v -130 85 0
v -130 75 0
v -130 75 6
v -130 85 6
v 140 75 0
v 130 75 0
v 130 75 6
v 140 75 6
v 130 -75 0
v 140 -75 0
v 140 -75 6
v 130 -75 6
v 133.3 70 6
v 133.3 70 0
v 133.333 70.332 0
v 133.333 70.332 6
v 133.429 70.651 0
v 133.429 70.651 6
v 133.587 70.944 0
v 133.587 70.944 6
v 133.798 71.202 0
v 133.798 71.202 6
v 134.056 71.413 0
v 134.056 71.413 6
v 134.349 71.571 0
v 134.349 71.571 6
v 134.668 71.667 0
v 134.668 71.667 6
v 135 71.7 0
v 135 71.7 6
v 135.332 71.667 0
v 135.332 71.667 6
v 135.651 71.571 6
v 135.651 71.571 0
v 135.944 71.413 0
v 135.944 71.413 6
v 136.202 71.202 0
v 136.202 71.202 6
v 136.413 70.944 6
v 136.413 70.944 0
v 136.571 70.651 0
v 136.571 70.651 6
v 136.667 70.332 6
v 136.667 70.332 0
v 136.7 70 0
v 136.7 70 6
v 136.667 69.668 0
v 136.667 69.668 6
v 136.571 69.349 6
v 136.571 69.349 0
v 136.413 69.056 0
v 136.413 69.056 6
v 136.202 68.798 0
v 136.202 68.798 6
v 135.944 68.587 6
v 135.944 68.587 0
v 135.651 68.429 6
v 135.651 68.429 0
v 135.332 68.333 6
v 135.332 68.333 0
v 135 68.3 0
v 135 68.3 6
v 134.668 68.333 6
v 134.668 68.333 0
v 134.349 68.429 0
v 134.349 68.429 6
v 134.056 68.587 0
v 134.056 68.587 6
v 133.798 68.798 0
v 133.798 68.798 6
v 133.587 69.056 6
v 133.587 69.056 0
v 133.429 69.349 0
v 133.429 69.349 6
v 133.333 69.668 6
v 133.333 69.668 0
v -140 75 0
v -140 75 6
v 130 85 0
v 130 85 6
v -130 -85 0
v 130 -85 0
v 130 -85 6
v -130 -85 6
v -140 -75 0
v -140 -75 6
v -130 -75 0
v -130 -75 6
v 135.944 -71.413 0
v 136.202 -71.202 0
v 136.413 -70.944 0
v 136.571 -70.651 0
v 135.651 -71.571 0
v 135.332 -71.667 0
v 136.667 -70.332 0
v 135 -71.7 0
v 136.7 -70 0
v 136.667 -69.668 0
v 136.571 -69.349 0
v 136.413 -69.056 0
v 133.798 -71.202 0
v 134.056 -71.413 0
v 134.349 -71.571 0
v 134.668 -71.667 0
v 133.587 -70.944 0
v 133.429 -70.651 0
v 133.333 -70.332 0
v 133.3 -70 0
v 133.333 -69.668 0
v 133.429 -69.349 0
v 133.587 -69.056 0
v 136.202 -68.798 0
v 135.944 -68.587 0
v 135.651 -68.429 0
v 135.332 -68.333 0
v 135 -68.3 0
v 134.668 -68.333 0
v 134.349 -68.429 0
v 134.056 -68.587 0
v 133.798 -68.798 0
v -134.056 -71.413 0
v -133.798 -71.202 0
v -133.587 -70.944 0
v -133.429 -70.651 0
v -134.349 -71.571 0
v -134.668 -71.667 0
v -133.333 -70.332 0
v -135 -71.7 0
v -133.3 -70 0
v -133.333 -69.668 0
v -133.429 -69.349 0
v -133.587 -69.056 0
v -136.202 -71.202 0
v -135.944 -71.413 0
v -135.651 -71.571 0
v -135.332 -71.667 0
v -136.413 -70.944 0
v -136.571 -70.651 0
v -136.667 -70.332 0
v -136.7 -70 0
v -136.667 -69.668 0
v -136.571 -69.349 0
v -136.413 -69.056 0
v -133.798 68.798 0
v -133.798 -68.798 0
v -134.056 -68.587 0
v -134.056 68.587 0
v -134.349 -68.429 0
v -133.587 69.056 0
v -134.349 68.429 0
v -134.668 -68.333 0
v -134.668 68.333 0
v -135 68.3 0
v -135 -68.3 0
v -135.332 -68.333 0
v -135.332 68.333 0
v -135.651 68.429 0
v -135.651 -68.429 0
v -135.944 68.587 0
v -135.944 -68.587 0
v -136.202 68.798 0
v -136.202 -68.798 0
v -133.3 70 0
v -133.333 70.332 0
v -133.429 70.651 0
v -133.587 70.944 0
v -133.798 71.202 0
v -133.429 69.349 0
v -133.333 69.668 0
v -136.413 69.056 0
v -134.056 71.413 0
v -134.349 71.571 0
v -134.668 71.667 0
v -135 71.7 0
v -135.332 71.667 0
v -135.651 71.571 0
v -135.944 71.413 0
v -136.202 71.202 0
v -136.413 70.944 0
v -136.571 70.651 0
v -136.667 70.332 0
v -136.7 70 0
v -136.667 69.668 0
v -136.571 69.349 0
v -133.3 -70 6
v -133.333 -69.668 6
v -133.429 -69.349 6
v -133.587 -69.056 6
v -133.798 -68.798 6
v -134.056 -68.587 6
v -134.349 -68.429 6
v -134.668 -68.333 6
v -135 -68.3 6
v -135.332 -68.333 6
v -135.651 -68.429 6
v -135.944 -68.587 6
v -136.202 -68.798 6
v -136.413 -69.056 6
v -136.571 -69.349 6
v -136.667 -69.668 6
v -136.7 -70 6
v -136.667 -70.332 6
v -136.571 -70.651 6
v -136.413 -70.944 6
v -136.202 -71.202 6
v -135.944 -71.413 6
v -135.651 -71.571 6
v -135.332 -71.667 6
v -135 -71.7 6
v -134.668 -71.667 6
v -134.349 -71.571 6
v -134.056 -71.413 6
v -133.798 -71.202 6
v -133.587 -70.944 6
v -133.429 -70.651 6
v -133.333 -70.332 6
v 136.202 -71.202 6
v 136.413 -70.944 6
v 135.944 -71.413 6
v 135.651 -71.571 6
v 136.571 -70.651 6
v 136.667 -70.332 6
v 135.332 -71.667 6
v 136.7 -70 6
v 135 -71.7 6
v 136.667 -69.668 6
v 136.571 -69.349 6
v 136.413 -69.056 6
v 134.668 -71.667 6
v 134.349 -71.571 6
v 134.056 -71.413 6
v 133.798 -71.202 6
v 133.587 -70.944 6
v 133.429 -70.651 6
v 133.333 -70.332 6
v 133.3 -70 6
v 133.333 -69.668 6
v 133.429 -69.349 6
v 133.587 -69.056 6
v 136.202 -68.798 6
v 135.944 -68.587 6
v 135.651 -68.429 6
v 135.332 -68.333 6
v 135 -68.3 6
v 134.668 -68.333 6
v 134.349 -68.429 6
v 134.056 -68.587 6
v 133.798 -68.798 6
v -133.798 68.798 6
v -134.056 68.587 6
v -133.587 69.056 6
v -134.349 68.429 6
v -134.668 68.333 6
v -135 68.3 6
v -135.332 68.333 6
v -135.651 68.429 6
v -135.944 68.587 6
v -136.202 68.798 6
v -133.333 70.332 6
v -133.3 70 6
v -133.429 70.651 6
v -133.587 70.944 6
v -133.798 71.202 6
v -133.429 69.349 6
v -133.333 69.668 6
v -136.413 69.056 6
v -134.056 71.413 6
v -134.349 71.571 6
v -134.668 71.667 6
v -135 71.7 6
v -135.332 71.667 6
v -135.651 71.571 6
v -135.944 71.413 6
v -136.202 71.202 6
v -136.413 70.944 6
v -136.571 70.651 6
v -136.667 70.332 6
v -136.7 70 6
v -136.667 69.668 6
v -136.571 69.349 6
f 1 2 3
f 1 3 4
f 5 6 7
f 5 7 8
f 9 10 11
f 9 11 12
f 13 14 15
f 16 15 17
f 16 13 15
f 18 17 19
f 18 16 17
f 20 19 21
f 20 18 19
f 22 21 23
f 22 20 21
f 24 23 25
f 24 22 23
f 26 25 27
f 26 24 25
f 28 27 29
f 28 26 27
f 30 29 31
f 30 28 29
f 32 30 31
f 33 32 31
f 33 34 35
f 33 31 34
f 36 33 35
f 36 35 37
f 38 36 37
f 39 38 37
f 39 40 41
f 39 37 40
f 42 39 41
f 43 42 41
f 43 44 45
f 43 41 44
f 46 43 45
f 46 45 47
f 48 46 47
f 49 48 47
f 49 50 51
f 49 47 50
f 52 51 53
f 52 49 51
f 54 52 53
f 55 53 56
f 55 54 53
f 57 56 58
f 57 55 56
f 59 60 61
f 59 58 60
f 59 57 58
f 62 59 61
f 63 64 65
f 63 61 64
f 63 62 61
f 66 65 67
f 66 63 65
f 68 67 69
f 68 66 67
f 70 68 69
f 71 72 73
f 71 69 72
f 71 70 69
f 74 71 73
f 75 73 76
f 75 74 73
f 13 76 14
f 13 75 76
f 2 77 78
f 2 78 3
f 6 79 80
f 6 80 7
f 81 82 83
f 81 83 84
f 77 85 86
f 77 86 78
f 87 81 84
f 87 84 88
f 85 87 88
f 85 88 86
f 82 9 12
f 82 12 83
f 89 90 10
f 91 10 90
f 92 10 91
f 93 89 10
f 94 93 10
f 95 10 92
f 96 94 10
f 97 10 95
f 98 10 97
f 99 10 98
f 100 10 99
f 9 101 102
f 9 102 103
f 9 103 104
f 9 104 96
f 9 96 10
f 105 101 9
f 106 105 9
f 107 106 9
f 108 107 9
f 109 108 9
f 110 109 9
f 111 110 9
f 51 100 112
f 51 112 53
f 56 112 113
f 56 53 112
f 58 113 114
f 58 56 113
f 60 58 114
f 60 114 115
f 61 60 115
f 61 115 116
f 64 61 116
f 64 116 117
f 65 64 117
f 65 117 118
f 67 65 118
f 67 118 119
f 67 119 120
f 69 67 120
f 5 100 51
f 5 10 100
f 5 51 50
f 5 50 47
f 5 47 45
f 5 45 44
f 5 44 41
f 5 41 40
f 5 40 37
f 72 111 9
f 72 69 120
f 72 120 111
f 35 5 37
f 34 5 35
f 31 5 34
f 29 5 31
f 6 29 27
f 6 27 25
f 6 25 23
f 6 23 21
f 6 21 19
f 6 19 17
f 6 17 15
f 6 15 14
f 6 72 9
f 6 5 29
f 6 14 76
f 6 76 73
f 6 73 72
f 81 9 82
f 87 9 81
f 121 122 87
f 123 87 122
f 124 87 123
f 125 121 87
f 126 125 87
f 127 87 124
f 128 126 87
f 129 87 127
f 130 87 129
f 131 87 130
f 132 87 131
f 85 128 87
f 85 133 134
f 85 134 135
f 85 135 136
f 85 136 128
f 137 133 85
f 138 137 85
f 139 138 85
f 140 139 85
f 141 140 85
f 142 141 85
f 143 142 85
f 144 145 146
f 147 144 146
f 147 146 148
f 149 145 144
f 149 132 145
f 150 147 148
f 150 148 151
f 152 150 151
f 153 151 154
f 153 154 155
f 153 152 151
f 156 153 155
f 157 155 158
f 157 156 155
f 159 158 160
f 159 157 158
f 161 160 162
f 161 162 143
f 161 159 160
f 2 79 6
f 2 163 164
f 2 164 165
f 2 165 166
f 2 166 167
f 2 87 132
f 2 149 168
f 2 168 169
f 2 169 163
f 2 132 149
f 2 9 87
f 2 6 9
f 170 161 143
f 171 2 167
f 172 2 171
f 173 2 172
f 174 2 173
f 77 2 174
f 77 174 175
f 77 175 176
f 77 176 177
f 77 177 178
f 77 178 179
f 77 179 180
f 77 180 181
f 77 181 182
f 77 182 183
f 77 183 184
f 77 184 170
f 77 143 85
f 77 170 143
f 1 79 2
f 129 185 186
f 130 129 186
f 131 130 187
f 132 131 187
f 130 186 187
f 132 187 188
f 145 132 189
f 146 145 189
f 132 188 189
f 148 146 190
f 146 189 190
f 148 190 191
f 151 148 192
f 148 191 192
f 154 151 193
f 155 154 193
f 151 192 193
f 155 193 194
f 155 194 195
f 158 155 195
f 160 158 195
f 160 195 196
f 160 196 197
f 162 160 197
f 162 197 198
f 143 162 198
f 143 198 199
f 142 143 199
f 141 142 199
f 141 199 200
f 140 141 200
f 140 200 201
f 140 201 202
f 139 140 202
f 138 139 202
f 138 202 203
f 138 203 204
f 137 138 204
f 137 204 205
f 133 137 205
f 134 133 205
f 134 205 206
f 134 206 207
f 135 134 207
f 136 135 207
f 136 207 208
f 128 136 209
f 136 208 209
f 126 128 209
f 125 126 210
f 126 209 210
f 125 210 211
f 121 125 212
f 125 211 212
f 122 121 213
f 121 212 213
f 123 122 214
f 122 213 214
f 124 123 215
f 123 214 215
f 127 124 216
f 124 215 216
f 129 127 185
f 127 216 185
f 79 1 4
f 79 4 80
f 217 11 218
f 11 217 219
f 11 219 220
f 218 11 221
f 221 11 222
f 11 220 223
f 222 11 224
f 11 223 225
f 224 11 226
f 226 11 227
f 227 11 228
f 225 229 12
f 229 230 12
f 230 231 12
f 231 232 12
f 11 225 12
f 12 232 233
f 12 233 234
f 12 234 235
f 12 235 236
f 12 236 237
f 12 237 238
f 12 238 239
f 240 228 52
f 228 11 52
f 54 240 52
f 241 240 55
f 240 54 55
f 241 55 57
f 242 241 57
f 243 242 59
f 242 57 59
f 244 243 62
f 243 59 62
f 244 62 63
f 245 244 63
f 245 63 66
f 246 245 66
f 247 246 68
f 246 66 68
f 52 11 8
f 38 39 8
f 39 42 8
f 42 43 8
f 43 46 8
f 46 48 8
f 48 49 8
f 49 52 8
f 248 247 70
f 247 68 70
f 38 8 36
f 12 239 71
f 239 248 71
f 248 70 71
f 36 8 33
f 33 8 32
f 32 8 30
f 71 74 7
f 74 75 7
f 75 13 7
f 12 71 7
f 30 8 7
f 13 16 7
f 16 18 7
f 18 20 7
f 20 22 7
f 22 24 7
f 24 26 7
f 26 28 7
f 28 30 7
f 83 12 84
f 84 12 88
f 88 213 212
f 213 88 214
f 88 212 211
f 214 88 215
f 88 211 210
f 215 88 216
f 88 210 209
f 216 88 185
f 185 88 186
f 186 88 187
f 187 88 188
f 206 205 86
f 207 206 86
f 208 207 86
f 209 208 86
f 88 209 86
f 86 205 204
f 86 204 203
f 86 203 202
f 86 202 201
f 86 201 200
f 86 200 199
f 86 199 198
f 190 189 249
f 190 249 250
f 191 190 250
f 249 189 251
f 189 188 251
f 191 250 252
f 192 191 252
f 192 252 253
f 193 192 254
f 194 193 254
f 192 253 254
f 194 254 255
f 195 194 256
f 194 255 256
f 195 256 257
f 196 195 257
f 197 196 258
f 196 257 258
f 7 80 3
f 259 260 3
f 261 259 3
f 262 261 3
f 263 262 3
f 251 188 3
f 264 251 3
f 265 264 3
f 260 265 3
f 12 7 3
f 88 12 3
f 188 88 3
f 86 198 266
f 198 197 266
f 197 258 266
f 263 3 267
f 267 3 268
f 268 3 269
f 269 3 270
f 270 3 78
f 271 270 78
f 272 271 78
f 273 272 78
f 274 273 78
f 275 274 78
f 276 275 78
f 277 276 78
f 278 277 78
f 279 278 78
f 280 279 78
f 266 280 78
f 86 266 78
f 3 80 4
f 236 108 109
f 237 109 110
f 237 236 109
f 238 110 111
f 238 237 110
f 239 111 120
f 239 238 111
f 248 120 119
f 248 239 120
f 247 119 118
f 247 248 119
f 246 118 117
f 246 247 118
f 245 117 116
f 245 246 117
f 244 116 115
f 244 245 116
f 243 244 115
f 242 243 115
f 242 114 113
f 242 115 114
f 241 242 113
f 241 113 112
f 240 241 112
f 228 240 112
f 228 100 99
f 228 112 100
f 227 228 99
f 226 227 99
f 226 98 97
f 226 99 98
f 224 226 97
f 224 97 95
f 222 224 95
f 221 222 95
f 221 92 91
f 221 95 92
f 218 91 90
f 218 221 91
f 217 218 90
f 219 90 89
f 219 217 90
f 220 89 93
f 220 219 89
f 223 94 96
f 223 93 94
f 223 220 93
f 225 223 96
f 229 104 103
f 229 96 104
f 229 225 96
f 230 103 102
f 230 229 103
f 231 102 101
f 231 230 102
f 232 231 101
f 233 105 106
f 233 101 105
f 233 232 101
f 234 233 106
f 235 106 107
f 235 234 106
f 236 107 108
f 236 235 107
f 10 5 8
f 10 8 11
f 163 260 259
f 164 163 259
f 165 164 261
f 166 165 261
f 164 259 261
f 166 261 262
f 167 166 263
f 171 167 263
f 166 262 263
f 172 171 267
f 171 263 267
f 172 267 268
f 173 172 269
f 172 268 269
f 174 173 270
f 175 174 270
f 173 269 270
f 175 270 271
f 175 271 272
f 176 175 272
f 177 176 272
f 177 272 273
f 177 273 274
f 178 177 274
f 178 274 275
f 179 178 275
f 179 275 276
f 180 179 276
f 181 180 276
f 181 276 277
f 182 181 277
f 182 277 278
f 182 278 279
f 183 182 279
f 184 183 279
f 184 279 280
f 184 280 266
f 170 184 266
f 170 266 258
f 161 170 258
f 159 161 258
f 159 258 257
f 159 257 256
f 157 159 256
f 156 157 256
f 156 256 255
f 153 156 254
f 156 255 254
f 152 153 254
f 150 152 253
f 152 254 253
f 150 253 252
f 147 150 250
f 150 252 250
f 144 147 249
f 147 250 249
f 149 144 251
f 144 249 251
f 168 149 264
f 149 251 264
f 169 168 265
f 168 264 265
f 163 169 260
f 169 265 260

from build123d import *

# Parameters (mm, degrees)
PAD_DEPTH    = 6
SKETCH001_R  = 1.7
POCKET_DEPTH = 661.244466


with BuildPart() as part:
    # Sketch → Pad (new body)
    with BuildSketch(Plane.XY):
        Polygon((-140, -75), (-140, 75), (-130, 75), (-130, 85), (130, 85), (130, 75), (140, 75), (140, -75), (130, -75), (130, -85), (-130, -85), (-130, -75), align=None)
    extrude(amount=PAD_DEPTH)

    # Sketch001 (on Face14 of Pad) → Pocket (cut, through all)
    with BuildSketch(Plane.XY.offset(6)):
        with Locations((-135, 70)):
            Circle(SKETCH001_R)
        with Locations((-135, -70)):
            Circle(SKETCH001_R)
    pocket = extrude(amount=-POCKET_DEPTH, mode=Mode.SUBTRACT)

    # Mirrored: Pocket across Sketch001 V_Axis
    add(pocket.mirror(Plane(origin=(0, 0, 6), x_dir=(0, 0, 1), z_dir=(1, 0, 0))), mode=Mode.SUBTRACT)


solid = part.part
